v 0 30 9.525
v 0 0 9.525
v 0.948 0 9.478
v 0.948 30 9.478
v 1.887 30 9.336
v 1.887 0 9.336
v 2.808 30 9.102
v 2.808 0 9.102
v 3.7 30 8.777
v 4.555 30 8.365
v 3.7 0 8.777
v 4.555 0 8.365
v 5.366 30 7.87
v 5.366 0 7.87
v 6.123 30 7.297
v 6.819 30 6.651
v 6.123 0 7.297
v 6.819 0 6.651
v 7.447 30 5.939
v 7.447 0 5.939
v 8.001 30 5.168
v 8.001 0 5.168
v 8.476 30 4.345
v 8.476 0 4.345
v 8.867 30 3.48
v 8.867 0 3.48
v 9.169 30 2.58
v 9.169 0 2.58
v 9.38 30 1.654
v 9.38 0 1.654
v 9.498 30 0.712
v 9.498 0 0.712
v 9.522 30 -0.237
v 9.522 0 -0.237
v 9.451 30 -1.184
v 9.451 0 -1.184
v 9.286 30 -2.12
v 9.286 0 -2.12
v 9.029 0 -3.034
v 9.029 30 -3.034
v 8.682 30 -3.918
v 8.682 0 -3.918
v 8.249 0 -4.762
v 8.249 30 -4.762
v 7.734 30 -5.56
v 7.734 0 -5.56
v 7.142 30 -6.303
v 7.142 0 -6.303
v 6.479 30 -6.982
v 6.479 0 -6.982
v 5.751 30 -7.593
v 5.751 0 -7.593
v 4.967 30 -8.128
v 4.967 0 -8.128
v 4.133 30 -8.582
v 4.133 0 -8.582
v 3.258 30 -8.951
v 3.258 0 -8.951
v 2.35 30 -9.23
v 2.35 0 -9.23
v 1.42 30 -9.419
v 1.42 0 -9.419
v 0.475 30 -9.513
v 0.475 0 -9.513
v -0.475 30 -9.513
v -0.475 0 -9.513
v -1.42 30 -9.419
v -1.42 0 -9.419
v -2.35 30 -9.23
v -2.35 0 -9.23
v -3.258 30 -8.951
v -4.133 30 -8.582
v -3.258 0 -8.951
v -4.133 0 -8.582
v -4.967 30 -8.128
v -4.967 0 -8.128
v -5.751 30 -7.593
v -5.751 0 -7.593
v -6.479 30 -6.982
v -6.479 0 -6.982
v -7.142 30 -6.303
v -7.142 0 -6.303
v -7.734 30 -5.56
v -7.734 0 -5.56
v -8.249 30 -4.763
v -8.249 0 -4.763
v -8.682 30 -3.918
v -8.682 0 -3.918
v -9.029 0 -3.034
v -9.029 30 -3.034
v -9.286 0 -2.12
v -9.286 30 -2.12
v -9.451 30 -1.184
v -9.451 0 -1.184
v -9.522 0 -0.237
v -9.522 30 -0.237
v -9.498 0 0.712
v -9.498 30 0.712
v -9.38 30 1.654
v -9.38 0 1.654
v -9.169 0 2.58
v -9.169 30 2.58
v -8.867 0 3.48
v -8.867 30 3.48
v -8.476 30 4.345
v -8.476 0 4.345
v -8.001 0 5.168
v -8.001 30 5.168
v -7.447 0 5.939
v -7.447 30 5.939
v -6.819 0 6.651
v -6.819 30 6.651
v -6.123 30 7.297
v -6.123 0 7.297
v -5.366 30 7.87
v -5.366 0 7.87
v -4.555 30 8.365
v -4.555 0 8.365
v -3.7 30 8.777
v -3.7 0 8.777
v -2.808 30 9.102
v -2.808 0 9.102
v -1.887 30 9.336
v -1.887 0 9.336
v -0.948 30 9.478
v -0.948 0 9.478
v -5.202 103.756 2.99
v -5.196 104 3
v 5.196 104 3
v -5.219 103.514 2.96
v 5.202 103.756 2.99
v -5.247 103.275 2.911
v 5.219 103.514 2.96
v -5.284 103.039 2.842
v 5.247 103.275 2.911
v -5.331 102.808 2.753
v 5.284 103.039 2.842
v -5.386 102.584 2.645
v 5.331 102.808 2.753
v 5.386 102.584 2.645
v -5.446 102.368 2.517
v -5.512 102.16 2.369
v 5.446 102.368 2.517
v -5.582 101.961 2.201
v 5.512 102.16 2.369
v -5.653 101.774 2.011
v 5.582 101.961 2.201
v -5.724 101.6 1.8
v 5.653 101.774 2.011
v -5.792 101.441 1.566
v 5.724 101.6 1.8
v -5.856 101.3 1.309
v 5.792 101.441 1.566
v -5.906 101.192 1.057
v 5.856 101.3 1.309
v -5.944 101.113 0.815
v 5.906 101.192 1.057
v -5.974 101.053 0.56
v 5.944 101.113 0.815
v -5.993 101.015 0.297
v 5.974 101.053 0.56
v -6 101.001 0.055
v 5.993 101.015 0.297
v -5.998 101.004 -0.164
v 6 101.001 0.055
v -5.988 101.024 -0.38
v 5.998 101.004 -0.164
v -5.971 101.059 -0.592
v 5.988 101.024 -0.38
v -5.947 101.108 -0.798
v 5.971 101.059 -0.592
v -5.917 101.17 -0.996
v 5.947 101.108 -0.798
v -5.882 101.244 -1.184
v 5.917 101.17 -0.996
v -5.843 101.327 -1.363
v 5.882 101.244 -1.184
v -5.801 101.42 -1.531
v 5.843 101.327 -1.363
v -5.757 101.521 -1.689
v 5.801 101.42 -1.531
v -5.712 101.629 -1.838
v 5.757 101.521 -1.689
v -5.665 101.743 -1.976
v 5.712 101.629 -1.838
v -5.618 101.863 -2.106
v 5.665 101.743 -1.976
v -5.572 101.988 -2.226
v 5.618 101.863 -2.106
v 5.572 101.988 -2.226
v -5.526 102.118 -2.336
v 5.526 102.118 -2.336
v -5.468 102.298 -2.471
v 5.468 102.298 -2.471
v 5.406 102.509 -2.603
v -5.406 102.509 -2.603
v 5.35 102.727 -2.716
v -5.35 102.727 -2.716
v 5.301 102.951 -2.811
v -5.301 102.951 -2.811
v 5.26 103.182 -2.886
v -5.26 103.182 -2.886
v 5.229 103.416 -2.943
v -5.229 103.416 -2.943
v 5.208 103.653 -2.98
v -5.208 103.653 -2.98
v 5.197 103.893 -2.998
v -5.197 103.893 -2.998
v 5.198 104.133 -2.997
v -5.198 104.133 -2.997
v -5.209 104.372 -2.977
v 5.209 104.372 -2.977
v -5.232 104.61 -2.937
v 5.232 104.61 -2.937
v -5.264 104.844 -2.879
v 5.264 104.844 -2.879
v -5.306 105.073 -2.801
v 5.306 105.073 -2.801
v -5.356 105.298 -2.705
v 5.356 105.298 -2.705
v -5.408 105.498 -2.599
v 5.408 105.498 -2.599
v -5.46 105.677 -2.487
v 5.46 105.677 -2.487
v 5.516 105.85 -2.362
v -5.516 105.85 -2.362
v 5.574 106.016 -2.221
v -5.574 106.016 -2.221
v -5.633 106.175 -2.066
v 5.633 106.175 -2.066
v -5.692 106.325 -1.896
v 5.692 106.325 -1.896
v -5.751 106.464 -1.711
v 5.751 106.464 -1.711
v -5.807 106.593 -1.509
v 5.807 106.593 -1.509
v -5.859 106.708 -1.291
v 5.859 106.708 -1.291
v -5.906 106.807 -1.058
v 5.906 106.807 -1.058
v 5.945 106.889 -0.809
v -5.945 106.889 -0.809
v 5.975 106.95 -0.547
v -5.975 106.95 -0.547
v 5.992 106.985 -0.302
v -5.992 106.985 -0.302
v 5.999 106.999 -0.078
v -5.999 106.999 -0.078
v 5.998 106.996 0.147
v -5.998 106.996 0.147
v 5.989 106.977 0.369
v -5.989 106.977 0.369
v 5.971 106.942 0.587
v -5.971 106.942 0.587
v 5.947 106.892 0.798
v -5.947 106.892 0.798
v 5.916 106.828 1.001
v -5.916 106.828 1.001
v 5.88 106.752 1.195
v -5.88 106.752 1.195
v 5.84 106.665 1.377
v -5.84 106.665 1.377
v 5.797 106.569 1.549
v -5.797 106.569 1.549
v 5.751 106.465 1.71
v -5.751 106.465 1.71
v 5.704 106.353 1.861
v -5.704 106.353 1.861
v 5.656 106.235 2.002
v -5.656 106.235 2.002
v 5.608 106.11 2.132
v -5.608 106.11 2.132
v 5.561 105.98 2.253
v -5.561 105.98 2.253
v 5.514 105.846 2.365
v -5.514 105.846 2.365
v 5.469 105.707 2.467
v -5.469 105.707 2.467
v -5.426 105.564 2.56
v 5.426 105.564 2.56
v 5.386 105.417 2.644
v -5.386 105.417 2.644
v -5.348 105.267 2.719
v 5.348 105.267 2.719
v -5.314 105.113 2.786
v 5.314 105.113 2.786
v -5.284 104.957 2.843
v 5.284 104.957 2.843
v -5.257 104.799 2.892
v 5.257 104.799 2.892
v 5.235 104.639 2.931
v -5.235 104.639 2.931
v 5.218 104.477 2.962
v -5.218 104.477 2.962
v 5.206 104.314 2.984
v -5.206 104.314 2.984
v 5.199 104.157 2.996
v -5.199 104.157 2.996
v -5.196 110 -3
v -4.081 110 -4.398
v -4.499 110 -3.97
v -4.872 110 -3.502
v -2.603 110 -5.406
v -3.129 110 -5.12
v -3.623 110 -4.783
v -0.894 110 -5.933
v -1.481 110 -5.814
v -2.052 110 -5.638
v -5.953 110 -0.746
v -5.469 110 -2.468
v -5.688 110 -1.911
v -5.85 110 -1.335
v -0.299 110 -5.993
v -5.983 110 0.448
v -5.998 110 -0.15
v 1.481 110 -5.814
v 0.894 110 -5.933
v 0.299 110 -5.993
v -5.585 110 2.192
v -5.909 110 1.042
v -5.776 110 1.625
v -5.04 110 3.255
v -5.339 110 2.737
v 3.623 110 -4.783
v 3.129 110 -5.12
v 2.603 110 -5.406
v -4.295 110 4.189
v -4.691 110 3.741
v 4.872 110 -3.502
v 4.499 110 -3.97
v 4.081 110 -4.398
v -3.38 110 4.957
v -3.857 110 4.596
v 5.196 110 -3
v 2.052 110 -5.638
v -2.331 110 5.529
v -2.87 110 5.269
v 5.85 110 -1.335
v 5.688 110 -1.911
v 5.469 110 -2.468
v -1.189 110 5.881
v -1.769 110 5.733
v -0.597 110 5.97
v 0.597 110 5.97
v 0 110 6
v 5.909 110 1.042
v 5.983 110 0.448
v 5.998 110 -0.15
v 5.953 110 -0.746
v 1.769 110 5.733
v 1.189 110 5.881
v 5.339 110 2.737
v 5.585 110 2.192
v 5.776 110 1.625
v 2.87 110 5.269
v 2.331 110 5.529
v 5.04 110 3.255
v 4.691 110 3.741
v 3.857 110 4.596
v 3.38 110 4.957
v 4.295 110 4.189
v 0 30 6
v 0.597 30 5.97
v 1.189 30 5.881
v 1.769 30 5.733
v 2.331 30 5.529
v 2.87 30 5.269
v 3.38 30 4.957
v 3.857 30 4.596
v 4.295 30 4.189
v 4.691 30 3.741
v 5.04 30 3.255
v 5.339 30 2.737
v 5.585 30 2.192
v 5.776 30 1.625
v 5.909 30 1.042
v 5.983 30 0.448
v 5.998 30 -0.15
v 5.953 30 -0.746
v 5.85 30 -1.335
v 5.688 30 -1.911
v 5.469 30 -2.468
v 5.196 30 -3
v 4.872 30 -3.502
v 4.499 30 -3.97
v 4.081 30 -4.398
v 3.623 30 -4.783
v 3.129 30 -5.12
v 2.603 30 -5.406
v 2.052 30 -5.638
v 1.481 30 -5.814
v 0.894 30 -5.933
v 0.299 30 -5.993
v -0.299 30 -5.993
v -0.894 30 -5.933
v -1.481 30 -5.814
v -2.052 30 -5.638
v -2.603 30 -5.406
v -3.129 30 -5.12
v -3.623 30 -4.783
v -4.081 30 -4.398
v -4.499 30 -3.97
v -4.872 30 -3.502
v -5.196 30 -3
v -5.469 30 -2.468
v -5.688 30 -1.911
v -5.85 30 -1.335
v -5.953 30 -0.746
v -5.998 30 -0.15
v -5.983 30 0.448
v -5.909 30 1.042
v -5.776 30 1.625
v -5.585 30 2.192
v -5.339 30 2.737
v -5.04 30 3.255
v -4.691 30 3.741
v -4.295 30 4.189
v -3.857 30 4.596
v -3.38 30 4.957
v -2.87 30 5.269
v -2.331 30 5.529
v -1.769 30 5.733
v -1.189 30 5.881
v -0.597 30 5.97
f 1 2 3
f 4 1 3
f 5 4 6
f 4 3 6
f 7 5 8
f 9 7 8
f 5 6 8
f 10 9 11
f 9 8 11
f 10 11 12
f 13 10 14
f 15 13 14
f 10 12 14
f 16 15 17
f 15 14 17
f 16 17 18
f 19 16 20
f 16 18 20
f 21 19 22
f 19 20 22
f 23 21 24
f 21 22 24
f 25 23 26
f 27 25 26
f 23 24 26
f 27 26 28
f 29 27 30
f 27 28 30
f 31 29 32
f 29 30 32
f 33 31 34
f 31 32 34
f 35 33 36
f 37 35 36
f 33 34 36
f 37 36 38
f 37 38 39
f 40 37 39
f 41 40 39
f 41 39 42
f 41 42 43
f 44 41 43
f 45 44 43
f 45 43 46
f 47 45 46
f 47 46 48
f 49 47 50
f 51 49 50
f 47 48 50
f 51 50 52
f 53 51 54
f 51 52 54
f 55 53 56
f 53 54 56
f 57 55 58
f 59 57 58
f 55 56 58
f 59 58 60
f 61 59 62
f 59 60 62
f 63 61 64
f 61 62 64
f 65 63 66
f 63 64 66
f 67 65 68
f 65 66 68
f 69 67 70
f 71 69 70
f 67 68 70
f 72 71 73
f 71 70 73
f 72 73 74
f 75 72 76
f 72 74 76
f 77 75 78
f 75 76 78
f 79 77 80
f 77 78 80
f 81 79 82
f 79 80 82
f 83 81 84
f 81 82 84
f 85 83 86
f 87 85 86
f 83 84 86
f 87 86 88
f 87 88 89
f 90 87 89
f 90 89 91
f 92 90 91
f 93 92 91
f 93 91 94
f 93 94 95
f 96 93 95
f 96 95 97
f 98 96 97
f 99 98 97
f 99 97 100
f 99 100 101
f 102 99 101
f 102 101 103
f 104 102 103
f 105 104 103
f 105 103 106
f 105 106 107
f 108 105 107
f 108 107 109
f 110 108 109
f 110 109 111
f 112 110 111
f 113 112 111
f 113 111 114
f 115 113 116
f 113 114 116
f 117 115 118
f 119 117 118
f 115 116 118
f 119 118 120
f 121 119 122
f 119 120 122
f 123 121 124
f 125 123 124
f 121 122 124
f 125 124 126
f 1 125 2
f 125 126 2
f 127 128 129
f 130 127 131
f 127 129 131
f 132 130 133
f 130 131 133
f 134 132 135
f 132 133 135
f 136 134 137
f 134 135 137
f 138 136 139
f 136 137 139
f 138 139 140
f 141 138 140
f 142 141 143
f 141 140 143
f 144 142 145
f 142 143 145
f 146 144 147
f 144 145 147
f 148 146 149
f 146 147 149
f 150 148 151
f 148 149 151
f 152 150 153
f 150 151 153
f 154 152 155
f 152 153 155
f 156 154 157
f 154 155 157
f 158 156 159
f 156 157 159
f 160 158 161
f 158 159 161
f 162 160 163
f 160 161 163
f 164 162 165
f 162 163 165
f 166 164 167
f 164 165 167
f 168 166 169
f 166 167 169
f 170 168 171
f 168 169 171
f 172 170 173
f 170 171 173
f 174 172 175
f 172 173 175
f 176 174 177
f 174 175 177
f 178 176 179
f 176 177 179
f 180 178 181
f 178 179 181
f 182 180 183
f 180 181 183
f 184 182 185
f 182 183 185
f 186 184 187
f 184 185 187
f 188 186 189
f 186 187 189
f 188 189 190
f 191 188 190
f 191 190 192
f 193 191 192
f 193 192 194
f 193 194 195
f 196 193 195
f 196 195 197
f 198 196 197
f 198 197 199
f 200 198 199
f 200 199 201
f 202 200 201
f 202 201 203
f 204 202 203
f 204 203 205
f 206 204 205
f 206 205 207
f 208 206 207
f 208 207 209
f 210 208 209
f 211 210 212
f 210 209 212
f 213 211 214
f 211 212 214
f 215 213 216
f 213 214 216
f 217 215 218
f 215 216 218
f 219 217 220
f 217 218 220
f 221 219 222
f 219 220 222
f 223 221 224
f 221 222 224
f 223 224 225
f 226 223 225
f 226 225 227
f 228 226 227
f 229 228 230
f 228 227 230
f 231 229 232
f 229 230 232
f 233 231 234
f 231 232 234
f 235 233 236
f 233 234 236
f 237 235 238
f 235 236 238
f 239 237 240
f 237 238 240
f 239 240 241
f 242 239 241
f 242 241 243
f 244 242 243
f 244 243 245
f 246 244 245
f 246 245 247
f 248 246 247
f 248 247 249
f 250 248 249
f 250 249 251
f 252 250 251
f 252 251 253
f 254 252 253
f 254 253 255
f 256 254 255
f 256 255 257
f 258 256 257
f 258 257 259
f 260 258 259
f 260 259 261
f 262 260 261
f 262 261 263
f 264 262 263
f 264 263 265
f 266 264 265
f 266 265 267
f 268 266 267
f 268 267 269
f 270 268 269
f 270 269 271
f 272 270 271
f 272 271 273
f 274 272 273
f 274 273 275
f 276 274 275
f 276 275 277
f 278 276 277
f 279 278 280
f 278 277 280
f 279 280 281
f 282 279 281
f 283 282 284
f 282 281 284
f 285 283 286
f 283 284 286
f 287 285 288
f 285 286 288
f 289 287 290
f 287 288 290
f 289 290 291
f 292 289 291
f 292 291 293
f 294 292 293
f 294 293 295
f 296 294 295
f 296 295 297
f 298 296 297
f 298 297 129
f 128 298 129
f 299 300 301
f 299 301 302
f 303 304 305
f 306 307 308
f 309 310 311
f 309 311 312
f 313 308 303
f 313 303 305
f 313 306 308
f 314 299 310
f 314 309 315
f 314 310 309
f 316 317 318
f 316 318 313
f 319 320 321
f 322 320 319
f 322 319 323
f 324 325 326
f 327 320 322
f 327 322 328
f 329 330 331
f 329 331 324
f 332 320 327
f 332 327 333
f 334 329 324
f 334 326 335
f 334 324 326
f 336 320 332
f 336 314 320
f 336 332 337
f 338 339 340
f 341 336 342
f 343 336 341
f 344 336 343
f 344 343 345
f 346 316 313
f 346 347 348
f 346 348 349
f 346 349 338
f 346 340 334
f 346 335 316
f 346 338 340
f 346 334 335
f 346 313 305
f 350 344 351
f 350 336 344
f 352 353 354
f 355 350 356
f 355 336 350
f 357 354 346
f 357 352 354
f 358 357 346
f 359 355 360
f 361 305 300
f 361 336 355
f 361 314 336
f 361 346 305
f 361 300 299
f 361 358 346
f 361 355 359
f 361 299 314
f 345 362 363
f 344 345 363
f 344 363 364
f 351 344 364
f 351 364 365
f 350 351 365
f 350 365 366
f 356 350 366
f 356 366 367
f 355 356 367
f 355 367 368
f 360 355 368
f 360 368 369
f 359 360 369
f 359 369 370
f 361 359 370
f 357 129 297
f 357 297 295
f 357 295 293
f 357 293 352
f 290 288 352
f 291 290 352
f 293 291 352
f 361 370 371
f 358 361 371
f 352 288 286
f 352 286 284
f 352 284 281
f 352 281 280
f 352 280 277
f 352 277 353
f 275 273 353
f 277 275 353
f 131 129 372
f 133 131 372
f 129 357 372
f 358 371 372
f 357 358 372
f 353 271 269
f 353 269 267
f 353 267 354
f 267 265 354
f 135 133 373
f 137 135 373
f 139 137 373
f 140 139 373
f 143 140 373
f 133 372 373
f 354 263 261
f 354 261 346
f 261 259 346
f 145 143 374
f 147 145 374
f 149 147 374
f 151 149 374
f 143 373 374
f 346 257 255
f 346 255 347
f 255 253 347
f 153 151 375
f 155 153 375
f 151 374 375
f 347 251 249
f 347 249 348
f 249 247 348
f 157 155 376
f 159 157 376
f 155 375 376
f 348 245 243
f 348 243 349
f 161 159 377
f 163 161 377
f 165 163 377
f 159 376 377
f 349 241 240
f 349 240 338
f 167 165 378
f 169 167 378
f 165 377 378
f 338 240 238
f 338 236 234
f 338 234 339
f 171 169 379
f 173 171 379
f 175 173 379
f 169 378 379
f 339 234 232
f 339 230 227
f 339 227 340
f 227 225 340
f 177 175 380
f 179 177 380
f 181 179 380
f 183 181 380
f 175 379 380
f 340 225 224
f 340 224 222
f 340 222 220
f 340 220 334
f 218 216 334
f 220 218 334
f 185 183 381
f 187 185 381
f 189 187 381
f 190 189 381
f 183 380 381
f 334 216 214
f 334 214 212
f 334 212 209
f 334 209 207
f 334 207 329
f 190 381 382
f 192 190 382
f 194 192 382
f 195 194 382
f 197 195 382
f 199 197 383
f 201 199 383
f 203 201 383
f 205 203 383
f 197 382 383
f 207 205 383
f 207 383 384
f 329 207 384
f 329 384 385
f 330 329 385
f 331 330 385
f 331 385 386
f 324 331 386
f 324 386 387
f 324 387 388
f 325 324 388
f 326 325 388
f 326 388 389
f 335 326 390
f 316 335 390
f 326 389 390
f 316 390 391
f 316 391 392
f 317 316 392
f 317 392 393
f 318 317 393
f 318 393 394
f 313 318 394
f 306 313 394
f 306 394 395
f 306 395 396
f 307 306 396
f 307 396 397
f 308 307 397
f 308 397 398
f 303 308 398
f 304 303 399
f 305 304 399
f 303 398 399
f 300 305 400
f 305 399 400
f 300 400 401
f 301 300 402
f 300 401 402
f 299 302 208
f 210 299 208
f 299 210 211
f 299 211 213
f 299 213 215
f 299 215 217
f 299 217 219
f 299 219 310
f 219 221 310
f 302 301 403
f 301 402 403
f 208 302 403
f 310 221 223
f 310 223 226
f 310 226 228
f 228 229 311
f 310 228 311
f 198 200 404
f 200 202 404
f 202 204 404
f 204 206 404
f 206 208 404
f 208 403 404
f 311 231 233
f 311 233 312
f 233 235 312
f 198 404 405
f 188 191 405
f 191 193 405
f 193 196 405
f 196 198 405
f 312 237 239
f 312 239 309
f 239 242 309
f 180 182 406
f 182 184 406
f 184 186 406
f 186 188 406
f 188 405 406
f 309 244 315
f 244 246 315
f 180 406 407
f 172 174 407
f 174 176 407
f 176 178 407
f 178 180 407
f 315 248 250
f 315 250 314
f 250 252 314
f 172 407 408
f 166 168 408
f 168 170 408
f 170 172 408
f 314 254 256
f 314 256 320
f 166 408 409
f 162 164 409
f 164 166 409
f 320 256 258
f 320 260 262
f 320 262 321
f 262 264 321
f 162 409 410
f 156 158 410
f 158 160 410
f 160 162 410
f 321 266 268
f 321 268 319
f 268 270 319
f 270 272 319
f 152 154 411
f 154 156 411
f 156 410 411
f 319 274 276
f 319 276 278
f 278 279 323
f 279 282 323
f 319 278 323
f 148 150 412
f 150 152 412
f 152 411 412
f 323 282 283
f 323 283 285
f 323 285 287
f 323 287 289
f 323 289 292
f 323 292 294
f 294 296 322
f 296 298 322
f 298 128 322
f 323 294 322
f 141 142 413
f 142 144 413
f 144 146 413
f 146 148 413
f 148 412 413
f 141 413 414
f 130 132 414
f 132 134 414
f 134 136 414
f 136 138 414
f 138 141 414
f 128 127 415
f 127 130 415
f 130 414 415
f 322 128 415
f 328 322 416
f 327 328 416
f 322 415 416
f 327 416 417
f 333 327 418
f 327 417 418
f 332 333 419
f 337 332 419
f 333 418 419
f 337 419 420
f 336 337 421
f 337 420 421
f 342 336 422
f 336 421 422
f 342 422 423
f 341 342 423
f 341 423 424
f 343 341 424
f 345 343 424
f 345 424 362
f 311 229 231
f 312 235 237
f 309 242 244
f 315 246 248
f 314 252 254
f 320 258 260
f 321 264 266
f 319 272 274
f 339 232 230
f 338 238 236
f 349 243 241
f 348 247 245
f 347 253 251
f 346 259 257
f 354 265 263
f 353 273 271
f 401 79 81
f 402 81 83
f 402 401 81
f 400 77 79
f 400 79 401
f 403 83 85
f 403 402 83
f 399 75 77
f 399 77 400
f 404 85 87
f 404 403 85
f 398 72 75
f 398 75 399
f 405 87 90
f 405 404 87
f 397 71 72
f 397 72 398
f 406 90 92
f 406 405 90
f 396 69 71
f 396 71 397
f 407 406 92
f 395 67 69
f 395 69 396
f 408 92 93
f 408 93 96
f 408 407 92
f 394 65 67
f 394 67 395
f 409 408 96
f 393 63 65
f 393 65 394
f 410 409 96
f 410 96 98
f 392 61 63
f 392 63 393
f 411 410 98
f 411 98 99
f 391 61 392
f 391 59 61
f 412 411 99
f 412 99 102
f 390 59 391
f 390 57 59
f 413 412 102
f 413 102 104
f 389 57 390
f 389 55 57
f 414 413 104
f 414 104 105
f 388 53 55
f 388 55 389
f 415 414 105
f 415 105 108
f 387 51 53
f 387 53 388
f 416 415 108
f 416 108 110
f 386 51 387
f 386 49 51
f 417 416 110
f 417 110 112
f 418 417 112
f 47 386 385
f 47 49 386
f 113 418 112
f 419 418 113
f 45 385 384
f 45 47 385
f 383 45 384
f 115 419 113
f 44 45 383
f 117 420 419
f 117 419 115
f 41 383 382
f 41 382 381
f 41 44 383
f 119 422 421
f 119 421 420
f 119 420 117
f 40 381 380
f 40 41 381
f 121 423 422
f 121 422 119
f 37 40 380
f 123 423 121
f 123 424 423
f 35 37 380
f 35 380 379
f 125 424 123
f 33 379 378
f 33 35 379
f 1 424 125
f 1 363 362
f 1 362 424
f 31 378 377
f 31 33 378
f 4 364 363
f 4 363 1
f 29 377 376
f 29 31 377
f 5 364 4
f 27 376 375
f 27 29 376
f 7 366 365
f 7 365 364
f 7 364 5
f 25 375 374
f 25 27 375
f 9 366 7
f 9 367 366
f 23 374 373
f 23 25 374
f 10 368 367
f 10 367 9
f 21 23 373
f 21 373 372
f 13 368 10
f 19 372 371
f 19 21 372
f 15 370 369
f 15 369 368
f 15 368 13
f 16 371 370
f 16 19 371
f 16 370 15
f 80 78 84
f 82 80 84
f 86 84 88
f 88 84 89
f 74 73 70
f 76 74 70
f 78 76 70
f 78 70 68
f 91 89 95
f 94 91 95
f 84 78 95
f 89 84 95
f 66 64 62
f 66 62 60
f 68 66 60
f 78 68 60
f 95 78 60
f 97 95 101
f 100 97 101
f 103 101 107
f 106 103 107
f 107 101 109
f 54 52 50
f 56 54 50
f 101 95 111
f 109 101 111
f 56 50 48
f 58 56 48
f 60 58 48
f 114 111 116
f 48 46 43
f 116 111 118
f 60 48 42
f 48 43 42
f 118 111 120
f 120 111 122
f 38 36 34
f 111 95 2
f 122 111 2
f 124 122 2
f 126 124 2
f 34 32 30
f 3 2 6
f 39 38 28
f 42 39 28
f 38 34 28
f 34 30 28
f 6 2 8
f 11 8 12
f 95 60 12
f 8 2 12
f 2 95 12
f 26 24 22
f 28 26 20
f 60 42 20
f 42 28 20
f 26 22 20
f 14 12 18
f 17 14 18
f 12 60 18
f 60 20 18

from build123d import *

# Parameters (mm, degrees)
SKETCH5_R                           = 9.525
BOSS_EXTRUDE4_DEPTH                 = 30
SKETCH6_R                           = 6
BOSS_EXTRUDE6_DEPTH                 = 110
CUT_EXTRUDE1_REACH                  = 112.822
CUT_EXTRUDE1_END_RADIUS             = 6
SKETCH7_R                           = 3
CUT_EXTRUDE1_DIRECTION_2_REACH      = 112.822
CUT_EXTRUDE1_DIRECTION_2_END_RADIUS = 6


with BuildPart() as part:
    # Sketch5 → Boss-Extrude4 (new body)
    with BuildSketch(Plane(origin=(0, 0, 0), x_dir=(1, 0, 0), z_dir=(0, 1, 0))):
        with Locations(Location((0, 0, 0), (0, 0, 270))):
            Circle(SKETCH5_R)
    extrude(amount=BOSS_EXTRUDE4_DEPTH)

    # Sketch6 → Boss-Extrude6 (add)
    with BuildSketch(Plane(origin=(0, 0, 0), x_dir=(1, 0, 0), z_dir=(0, 1, 0))):
        with Locations(Location((0, 0, 0), (0, 0, 270))):
            Circle(SKETCH6_R)
    extrude(amount=BOSS_EXTRUDE6_DEPTH)

    # Cut-Extrude1: up to this cylinder (the profile starts inside it)
    cut_extrude1_end = Plane(origin=(0, 104, 0), z_dir=(0, -1, 0)) * Cylinder(CUT_EXTRUDE1_END_RADIUS, 238.644, mode=Mode.PRIVATE)
    # Sketch7 → Cut-Extrude1 (cut, up to the surface)
    with BuildSketch(Plane(origin=(0, 0, 0), x_dir=(0, 0, -1), z_dir=(1, 0, 0)), mode=Mode.PRIVATE) as cut_extrude1_sk1:
        with Locations(Location((0, 104, 0), (0, 0, 180))):
            Circle(SKETCH7_R)
    cut_extrude1_tool1 = extrude(cut_extrude1_sk1.sketch, amount=-CUT_EXTRUDE1_REACH, mode=Mode.PRIVATE) & cut_extrude1_end
    add(cut_extrude1_tool1.solids().sort_by_distance((0, 104, 0))[0], mode=Mode.SUBTRACT)

    # Cut-Extrude1 direction 2: up to this cylinder (the profile starts inside it)
    cut_extrude1_direction_2_end = Plane(origin=(0, 104, 0), z_dir=(0, -1, 0)) * Cylinder(CUT_EXTRUDE1_DIRECTION_2_END_RADIUS, 238.644, mode=Mode.PRIVATE)
    # Sketch7 → Cut-Extrude1 direction 2 (cut, up to the surface)
    with BuildSketch(Plane(origin=(0, 0, 0), x_dir=(0, 0, -1), z_dir=(1, 0, 0)), mode=Mode.PRIVATE) as cut_extrude1_direction_2_sk1:
        with Locations(Location((0, 104, 0), (0, 0, 180))):
            Circle(SKETCH7_R)
    cut_extrude1_direction_2_tool1 = extrude(cut_extrude1_direction_2_sk1.sketch, amount=CUT_EXTRUDE1_DIRECTION_2_REACH, mode=Mode.PRIVATE) & cut_extrude1_direction_2_end
    add(cut_extrude1_direction_2_tool1.solids().sort_by_distance((0, 104, 0))[0], mode=Mode.SUBTRACT)


solid = part.part
